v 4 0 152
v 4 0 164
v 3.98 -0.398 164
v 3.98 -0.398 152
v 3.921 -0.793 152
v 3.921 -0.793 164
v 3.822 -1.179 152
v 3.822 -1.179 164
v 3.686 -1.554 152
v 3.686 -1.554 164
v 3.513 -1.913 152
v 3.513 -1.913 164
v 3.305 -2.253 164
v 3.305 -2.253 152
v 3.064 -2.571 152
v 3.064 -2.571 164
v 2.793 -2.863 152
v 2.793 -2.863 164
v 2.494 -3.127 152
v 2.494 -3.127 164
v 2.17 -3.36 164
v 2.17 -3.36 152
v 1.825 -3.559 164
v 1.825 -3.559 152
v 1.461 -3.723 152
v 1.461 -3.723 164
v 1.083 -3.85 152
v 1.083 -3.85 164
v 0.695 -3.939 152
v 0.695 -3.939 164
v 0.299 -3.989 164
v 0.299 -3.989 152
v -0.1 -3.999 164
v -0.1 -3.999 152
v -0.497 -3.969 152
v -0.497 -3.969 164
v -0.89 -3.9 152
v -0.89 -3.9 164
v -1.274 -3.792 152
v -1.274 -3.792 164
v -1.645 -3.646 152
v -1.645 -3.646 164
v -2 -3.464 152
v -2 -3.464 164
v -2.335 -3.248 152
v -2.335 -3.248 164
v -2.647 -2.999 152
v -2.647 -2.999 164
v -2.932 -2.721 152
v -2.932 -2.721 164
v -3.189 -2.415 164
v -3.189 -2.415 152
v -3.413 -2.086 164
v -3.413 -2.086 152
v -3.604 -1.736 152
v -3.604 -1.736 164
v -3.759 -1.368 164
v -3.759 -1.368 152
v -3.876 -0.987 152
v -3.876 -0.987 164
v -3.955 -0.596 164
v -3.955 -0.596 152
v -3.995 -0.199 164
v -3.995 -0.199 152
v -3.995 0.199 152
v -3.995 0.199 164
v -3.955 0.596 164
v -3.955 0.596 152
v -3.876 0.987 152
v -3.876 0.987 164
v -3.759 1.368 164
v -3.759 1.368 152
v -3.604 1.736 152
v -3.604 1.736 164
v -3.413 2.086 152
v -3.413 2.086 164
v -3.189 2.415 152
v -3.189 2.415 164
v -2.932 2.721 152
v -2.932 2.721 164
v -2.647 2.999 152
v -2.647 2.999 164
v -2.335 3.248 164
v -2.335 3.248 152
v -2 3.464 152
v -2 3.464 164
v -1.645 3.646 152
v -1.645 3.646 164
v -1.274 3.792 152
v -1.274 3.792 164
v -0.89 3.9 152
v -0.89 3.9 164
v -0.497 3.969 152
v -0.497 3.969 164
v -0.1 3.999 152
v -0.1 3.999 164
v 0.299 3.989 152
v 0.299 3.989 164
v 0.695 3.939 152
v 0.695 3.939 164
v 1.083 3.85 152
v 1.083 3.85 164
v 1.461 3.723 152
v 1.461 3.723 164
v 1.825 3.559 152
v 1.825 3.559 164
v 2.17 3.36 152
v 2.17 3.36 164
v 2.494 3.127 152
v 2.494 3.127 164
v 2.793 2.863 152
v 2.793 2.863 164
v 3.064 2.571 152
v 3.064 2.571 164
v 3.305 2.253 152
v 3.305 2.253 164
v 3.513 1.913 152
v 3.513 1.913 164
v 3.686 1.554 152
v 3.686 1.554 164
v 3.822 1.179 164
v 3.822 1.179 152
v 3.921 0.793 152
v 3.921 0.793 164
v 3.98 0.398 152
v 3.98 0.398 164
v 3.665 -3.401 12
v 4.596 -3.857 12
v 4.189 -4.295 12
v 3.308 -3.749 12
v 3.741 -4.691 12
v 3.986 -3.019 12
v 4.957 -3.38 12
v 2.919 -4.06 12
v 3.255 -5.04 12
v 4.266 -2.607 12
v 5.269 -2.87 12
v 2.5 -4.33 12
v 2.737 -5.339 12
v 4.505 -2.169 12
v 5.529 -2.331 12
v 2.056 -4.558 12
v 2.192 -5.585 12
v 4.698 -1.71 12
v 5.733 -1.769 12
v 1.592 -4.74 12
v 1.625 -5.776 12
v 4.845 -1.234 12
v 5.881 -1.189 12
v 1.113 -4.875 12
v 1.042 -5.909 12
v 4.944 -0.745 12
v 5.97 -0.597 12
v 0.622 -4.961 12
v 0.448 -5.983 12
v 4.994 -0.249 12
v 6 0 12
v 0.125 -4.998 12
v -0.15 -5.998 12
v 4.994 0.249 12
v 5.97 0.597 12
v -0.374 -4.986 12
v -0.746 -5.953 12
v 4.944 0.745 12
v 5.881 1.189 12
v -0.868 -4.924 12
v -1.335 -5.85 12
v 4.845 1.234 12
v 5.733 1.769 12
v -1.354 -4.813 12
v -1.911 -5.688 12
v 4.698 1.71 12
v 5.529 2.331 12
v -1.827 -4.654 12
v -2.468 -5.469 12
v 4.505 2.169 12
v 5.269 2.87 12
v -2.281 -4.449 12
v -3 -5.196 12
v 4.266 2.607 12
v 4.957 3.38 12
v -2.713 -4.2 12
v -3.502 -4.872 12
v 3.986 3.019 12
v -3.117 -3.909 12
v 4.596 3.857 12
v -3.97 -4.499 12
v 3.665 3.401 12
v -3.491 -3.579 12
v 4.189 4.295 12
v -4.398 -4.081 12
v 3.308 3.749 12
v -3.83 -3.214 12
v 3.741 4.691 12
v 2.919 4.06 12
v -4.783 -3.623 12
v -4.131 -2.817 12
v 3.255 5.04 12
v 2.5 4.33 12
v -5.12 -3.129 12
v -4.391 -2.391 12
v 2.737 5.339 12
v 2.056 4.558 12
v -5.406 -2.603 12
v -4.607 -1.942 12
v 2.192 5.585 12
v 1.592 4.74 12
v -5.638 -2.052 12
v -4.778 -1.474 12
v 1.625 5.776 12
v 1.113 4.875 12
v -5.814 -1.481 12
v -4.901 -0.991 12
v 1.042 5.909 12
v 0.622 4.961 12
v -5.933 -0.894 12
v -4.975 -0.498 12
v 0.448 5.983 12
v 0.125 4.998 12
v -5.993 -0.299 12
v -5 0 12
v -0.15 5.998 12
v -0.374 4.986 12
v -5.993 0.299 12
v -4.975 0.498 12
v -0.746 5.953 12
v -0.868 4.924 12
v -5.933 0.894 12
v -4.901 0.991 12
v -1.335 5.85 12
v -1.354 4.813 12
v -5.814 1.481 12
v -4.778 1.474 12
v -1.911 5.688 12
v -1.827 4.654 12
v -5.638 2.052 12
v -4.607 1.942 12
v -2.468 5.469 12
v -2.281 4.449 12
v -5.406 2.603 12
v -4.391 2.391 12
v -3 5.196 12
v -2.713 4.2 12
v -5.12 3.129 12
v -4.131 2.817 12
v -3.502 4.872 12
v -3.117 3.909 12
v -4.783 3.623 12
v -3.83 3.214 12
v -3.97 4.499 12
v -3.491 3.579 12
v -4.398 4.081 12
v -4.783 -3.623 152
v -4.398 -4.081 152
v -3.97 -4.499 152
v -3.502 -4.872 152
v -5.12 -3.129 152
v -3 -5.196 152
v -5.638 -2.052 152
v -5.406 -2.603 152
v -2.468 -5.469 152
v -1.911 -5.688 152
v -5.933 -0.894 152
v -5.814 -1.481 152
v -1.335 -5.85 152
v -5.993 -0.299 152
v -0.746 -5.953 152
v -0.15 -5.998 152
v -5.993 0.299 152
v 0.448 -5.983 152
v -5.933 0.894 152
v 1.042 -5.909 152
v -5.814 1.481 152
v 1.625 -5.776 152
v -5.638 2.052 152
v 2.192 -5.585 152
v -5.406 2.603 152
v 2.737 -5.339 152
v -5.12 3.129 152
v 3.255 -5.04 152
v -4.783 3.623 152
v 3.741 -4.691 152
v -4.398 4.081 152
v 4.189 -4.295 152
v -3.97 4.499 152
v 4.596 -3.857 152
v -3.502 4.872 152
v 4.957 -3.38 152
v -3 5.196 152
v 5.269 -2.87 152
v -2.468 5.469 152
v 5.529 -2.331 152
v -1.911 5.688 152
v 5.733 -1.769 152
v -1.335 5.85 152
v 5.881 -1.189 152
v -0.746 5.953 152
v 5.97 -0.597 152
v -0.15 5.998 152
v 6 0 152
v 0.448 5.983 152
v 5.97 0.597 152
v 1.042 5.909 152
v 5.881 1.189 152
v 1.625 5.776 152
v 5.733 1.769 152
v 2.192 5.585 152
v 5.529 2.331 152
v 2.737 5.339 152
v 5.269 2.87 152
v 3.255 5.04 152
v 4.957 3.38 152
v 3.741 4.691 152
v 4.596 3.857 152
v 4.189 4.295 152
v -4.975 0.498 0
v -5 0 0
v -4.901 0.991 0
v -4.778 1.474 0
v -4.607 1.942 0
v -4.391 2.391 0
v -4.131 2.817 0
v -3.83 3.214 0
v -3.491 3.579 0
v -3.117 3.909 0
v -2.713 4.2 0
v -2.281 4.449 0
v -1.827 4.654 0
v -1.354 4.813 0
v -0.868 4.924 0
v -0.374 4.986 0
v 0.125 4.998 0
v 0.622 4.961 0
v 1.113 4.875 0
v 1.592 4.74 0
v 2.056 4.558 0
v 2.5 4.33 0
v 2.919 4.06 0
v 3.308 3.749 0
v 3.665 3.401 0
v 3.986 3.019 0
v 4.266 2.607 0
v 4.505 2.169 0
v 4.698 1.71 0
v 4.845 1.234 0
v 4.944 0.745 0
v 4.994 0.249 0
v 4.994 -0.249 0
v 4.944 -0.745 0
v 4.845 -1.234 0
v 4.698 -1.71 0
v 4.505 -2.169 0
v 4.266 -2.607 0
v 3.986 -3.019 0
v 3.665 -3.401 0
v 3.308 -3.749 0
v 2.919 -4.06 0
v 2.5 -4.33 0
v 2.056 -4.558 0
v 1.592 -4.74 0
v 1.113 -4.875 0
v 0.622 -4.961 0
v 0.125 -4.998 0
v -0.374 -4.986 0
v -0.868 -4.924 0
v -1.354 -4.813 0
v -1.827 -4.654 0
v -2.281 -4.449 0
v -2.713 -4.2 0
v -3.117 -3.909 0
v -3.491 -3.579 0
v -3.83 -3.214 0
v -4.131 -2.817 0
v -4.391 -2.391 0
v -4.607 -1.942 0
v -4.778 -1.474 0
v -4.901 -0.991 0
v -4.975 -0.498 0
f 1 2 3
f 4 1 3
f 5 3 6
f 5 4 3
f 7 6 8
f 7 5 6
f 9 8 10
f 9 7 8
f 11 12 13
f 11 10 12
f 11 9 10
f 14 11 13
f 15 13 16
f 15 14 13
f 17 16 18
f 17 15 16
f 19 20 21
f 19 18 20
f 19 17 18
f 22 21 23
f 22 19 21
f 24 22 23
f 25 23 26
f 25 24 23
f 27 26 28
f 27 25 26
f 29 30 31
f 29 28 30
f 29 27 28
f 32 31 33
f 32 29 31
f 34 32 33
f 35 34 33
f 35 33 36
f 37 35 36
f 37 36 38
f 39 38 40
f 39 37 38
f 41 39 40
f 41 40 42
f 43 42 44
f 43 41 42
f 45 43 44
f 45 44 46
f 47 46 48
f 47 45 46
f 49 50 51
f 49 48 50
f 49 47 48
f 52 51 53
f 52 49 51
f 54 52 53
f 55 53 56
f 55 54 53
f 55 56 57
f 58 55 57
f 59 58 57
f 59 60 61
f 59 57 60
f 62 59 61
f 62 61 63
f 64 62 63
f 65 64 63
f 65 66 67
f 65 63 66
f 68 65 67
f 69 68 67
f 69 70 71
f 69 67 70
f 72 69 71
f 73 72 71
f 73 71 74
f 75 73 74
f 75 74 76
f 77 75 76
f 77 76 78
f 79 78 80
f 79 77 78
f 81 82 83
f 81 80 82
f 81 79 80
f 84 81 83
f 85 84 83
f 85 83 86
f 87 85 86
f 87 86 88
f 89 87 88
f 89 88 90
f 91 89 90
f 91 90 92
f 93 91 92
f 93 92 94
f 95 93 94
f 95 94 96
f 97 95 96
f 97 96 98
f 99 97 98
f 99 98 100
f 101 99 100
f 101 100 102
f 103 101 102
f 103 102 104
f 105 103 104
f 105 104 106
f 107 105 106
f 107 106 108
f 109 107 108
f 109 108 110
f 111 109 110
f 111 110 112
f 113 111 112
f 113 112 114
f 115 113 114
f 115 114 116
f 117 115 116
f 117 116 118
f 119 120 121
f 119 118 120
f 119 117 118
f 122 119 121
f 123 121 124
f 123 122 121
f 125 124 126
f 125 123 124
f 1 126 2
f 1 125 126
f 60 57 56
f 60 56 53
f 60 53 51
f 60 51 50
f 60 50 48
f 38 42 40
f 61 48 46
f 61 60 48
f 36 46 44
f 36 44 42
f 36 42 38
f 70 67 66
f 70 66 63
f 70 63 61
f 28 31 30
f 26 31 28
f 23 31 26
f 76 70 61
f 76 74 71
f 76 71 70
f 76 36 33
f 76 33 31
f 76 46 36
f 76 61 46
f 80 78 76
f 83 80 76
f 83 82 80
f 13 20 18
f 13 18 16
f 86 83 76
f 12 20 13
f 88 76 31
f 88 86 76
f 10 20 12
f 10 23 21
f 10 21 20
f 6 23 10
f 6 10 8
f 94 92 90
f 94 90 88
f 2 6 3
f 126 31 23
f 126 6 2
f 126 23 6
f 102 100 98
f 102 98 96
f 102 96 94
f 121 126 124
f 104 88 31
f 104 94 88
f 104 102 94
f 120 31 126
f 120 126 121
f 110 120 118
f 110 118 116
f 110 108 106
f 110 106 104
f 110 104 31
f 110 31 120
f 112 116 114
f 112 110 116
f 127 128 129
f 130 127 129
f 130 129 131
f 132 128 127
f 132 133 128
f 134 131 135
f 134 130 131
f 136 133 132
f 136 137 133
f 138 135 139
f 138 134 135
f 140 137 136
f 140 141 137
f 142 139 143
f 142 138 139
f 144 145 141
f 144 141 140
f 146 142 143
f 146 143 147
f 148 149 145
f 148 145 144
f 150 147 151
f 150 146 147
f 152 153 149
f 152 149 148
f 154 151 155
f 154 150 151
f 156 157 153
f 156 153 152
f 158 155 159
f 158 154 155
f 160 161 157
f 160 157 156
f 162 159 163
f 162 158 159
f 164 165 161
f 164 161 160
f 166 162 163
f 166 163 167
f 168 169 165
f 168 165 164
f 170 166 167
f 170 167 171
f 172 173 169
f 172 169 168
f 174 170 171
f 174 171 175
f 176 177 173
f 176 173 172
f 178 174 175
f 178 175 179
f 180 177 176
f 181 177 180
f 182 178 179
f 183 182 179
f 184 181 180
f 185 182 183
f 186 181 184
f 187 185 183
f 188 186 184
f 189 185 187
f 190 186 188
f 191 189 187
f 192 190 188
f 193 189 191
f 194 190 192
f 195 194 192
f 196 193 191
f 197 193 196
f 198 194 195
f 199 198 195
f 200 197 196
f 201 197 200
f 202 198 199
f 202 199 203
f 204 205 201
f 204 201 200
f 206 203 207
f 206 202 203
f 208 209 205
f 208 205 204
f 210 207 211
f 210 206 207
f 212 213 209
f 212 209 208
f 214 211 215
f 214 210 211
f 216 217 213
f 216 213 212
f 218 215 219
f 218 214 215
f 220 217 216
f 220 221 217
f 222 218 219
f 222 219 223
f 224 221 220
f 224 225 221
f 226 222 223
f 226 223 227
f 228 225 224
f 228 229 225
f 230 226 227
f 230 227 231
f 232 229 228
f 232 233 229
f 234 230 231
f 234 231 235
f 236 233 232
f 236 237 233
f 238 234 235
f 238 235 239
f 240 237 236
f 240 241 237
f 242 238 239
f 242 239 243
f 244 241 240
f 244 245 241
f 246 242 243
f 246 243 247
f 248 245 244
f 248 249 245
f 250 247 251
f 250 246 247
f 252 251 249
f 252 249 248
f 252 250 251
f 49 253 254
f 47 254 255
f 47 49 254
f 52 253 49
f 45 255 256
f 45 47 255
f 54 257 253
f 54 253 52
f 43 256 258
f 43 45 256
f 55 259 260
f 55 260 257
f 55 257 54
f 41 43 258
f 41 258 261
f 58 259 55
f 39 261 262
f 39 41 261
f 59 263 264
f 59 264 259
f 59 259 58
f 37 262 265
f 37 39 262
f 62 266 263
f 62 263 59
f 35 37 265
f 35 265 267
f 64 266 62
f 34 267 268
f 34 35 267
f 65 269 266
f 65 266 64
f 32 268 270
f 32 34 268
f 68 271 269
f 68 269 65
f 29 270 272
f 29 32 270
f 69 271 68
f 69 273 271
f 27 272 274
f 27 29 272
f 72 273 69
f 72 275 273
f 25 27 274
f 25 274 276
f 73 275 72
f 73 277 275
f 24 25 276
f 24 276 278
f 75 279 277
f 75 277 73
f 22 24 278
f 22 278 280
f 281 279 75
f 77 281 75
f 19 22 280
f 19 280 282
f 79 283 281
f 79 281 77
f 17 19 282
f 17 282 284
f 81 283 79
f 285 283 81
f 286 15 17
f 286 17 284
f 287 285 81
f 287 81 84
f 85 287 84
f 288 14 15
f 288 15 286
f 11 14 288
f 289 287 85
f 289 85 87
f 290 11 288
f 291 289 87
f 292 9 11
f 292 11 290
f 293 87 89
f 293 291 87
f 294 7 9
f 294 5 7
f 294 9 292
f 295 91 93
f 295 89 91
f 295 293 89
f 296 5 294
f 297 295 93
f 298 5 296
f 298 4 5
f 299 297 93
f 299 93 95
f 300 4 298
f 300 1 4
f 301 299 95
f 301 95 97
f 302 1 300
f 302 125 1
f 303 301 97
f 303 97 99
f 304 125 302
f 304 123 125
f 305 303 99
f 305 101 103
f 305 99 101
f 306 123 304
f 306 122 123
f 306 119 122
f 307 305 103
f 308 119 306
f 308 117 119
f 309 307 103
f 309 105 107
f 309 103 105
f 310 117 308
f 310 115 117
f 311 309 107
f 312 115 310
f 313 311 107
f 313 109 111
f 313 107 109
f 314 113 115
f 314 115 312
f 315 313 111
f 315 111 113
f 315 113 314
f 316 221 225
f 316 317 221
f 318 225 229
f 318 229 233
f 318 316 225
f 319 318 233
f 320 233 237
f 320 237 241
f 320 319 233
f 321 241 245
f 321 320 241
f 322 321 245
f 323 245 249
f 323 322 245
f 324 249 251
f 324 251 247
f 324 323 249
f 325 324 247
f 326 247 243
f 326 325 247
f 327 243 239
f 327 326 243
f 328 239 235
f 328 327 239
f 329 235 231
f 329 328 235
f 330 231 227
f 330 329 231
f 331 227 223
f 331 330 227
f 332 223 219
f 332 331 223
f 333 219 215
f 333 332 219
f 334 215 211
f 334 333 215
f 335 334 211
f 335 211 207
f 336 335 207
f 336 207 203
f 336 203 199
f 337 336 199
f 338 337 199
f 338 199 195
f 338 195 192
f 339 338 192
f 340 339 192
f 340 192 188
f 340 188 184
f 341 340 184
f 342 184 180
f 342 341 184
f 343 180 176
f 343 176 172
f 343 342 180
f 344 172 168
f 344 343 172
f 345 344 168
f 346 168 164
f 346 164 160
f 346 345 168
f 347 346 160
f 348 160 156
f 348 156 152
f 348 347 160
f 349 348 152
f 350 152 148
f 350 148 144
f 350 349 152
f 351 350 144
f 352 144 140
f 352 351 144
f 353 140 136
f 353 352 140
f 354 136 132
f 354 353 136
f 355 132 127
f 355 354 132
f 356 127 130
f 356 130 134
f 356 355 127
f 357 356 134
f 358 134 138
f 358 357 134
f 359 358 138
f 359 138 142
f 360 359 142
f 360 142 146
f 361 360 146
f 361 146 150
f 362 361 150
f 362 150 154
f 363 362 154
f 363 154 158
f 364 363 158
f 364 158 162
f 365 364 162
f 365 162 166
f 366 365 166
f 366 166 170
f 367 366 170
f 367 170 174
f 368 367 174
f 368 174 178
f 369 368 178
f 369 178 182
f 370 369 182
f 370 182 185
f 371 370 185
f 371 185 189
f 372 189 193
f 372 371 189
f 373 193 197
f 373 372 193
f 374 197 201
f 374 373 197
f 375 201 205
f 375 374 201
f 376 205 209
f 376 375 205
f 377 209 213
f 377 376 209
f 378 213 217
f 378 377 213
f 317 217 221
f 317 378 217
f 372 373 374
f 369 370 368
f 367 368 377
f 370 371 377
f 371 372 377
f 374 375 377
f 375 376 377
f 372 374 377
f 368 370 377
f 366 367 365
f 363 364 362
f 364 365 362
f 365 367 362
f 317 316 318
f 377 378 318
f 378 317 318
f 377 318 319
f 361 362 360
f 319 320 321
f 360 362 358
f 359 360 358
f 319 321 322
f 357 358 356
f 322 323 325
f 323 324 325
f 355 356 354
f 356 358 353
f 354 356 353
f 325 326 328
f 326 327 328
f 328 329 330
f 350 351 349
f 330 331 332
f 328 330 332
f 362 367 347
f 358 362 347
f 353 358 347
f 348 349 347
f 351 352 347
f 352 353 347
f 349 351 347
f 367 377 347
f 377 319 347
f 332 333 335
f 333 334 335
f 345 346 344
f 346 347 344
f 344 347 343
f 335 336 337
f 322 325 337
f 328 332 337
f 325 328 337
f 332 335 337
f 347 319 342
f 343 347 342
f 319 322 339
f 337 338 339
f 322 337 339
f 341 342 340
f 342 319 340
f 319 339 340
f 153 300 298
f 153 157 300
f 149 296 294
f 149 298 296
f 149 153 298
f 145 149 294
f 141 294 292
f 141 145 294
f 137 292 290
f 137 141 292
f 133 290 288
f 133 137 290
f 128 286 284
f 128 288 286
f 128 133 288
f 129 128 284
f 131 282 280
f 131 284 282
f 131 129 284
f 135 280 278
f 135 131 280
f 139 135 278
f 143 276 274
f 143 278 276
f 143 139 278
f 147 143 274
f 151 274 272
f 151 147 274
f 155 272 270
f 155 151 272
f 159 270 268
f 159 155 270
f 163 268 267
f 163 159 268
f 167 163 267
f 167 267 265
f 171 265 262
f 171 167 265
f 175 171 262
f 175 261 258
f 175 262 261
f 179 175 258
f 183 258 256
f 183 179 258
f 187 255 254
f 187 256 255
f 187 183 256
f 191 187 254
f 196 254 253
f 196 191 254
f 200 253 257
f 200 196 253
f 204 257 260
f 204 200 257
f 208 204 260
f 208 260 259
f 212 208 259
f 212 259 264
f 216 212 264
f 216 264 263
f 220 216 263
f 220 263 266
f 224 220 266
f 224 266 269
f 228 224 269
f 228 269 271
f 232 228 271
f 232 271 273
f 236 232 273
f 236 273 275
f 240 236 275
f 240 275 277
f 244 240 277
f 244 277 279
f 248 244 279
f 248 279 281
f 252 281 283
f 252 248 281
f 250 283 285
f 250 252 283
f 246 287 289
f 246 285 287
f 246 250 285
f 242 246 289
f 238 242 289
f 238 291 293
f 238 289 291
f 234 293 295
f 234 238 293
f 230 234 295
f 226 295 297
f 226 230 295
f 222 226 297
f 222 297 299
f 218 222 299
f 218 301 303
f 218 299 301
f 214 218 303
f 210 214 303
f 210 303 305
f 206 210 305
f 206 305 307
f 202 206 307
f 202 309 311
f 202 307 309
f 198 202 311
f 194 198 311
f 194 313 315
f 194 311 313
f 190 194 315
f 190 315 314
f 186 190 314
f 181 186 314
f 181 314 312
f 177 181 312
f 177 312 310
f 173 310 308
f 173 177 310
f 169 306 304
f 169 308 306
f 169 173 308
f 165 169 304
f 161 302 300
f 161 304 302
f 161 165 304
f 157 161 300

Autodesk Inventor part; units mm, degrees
ref_plane "YZ Plane" through (0, 0, 0) normal (1, 0, 0) x (0, 1, 0)
ref_plane "XZ Plane" through (0, 0, 0) normal (0, 1, 0) x (-1, 0, 0)
ref_plane "XY Plane" through (0, 0, 0) normal (0, 0, 1) x (1, 0, 0)
sketch "Sketch1" plane through (0, 0, 0) normal (0, 0, 1) x (1, 0, 0)
  circle A0 centre (0, 0) radius 6
  dimension "d0" = 12
extrude "Extrusion1" add sketch "Sketch1" along normal blind 152
thread "Thread1" size "M12x1.5" class "6g" standard "ISO Metric profile" length 155
sketch "Sketch2" plane through (0, 0, 152) normal (0, 0, 1) x (1, 0, 0)
  circle A0 centre (0, 0) radius 6 projected
  circle A1 centre (0, 0) radius 4
  dimension "d5" = 8
extrude "Extrusion2" add sketch "Sketch2" along normal blind 12 contours A1
sketch "Sketch3" plane through (0, 0, 0) normal (0, 0, -1) x (-1, 0, 0)
  circle A0 centre (0, 0) radius 5
  circle A1 centre (0, 0) radius 4 projected
  circle A2 centre (0, 0) radius 6
  dimension "d8" = 10
extrude "Extrusion3" cut sketch "Sketch3" against normal blind 12 contours A2
properties part number "Tornillo de Soporte de Motor" material "Steel"
